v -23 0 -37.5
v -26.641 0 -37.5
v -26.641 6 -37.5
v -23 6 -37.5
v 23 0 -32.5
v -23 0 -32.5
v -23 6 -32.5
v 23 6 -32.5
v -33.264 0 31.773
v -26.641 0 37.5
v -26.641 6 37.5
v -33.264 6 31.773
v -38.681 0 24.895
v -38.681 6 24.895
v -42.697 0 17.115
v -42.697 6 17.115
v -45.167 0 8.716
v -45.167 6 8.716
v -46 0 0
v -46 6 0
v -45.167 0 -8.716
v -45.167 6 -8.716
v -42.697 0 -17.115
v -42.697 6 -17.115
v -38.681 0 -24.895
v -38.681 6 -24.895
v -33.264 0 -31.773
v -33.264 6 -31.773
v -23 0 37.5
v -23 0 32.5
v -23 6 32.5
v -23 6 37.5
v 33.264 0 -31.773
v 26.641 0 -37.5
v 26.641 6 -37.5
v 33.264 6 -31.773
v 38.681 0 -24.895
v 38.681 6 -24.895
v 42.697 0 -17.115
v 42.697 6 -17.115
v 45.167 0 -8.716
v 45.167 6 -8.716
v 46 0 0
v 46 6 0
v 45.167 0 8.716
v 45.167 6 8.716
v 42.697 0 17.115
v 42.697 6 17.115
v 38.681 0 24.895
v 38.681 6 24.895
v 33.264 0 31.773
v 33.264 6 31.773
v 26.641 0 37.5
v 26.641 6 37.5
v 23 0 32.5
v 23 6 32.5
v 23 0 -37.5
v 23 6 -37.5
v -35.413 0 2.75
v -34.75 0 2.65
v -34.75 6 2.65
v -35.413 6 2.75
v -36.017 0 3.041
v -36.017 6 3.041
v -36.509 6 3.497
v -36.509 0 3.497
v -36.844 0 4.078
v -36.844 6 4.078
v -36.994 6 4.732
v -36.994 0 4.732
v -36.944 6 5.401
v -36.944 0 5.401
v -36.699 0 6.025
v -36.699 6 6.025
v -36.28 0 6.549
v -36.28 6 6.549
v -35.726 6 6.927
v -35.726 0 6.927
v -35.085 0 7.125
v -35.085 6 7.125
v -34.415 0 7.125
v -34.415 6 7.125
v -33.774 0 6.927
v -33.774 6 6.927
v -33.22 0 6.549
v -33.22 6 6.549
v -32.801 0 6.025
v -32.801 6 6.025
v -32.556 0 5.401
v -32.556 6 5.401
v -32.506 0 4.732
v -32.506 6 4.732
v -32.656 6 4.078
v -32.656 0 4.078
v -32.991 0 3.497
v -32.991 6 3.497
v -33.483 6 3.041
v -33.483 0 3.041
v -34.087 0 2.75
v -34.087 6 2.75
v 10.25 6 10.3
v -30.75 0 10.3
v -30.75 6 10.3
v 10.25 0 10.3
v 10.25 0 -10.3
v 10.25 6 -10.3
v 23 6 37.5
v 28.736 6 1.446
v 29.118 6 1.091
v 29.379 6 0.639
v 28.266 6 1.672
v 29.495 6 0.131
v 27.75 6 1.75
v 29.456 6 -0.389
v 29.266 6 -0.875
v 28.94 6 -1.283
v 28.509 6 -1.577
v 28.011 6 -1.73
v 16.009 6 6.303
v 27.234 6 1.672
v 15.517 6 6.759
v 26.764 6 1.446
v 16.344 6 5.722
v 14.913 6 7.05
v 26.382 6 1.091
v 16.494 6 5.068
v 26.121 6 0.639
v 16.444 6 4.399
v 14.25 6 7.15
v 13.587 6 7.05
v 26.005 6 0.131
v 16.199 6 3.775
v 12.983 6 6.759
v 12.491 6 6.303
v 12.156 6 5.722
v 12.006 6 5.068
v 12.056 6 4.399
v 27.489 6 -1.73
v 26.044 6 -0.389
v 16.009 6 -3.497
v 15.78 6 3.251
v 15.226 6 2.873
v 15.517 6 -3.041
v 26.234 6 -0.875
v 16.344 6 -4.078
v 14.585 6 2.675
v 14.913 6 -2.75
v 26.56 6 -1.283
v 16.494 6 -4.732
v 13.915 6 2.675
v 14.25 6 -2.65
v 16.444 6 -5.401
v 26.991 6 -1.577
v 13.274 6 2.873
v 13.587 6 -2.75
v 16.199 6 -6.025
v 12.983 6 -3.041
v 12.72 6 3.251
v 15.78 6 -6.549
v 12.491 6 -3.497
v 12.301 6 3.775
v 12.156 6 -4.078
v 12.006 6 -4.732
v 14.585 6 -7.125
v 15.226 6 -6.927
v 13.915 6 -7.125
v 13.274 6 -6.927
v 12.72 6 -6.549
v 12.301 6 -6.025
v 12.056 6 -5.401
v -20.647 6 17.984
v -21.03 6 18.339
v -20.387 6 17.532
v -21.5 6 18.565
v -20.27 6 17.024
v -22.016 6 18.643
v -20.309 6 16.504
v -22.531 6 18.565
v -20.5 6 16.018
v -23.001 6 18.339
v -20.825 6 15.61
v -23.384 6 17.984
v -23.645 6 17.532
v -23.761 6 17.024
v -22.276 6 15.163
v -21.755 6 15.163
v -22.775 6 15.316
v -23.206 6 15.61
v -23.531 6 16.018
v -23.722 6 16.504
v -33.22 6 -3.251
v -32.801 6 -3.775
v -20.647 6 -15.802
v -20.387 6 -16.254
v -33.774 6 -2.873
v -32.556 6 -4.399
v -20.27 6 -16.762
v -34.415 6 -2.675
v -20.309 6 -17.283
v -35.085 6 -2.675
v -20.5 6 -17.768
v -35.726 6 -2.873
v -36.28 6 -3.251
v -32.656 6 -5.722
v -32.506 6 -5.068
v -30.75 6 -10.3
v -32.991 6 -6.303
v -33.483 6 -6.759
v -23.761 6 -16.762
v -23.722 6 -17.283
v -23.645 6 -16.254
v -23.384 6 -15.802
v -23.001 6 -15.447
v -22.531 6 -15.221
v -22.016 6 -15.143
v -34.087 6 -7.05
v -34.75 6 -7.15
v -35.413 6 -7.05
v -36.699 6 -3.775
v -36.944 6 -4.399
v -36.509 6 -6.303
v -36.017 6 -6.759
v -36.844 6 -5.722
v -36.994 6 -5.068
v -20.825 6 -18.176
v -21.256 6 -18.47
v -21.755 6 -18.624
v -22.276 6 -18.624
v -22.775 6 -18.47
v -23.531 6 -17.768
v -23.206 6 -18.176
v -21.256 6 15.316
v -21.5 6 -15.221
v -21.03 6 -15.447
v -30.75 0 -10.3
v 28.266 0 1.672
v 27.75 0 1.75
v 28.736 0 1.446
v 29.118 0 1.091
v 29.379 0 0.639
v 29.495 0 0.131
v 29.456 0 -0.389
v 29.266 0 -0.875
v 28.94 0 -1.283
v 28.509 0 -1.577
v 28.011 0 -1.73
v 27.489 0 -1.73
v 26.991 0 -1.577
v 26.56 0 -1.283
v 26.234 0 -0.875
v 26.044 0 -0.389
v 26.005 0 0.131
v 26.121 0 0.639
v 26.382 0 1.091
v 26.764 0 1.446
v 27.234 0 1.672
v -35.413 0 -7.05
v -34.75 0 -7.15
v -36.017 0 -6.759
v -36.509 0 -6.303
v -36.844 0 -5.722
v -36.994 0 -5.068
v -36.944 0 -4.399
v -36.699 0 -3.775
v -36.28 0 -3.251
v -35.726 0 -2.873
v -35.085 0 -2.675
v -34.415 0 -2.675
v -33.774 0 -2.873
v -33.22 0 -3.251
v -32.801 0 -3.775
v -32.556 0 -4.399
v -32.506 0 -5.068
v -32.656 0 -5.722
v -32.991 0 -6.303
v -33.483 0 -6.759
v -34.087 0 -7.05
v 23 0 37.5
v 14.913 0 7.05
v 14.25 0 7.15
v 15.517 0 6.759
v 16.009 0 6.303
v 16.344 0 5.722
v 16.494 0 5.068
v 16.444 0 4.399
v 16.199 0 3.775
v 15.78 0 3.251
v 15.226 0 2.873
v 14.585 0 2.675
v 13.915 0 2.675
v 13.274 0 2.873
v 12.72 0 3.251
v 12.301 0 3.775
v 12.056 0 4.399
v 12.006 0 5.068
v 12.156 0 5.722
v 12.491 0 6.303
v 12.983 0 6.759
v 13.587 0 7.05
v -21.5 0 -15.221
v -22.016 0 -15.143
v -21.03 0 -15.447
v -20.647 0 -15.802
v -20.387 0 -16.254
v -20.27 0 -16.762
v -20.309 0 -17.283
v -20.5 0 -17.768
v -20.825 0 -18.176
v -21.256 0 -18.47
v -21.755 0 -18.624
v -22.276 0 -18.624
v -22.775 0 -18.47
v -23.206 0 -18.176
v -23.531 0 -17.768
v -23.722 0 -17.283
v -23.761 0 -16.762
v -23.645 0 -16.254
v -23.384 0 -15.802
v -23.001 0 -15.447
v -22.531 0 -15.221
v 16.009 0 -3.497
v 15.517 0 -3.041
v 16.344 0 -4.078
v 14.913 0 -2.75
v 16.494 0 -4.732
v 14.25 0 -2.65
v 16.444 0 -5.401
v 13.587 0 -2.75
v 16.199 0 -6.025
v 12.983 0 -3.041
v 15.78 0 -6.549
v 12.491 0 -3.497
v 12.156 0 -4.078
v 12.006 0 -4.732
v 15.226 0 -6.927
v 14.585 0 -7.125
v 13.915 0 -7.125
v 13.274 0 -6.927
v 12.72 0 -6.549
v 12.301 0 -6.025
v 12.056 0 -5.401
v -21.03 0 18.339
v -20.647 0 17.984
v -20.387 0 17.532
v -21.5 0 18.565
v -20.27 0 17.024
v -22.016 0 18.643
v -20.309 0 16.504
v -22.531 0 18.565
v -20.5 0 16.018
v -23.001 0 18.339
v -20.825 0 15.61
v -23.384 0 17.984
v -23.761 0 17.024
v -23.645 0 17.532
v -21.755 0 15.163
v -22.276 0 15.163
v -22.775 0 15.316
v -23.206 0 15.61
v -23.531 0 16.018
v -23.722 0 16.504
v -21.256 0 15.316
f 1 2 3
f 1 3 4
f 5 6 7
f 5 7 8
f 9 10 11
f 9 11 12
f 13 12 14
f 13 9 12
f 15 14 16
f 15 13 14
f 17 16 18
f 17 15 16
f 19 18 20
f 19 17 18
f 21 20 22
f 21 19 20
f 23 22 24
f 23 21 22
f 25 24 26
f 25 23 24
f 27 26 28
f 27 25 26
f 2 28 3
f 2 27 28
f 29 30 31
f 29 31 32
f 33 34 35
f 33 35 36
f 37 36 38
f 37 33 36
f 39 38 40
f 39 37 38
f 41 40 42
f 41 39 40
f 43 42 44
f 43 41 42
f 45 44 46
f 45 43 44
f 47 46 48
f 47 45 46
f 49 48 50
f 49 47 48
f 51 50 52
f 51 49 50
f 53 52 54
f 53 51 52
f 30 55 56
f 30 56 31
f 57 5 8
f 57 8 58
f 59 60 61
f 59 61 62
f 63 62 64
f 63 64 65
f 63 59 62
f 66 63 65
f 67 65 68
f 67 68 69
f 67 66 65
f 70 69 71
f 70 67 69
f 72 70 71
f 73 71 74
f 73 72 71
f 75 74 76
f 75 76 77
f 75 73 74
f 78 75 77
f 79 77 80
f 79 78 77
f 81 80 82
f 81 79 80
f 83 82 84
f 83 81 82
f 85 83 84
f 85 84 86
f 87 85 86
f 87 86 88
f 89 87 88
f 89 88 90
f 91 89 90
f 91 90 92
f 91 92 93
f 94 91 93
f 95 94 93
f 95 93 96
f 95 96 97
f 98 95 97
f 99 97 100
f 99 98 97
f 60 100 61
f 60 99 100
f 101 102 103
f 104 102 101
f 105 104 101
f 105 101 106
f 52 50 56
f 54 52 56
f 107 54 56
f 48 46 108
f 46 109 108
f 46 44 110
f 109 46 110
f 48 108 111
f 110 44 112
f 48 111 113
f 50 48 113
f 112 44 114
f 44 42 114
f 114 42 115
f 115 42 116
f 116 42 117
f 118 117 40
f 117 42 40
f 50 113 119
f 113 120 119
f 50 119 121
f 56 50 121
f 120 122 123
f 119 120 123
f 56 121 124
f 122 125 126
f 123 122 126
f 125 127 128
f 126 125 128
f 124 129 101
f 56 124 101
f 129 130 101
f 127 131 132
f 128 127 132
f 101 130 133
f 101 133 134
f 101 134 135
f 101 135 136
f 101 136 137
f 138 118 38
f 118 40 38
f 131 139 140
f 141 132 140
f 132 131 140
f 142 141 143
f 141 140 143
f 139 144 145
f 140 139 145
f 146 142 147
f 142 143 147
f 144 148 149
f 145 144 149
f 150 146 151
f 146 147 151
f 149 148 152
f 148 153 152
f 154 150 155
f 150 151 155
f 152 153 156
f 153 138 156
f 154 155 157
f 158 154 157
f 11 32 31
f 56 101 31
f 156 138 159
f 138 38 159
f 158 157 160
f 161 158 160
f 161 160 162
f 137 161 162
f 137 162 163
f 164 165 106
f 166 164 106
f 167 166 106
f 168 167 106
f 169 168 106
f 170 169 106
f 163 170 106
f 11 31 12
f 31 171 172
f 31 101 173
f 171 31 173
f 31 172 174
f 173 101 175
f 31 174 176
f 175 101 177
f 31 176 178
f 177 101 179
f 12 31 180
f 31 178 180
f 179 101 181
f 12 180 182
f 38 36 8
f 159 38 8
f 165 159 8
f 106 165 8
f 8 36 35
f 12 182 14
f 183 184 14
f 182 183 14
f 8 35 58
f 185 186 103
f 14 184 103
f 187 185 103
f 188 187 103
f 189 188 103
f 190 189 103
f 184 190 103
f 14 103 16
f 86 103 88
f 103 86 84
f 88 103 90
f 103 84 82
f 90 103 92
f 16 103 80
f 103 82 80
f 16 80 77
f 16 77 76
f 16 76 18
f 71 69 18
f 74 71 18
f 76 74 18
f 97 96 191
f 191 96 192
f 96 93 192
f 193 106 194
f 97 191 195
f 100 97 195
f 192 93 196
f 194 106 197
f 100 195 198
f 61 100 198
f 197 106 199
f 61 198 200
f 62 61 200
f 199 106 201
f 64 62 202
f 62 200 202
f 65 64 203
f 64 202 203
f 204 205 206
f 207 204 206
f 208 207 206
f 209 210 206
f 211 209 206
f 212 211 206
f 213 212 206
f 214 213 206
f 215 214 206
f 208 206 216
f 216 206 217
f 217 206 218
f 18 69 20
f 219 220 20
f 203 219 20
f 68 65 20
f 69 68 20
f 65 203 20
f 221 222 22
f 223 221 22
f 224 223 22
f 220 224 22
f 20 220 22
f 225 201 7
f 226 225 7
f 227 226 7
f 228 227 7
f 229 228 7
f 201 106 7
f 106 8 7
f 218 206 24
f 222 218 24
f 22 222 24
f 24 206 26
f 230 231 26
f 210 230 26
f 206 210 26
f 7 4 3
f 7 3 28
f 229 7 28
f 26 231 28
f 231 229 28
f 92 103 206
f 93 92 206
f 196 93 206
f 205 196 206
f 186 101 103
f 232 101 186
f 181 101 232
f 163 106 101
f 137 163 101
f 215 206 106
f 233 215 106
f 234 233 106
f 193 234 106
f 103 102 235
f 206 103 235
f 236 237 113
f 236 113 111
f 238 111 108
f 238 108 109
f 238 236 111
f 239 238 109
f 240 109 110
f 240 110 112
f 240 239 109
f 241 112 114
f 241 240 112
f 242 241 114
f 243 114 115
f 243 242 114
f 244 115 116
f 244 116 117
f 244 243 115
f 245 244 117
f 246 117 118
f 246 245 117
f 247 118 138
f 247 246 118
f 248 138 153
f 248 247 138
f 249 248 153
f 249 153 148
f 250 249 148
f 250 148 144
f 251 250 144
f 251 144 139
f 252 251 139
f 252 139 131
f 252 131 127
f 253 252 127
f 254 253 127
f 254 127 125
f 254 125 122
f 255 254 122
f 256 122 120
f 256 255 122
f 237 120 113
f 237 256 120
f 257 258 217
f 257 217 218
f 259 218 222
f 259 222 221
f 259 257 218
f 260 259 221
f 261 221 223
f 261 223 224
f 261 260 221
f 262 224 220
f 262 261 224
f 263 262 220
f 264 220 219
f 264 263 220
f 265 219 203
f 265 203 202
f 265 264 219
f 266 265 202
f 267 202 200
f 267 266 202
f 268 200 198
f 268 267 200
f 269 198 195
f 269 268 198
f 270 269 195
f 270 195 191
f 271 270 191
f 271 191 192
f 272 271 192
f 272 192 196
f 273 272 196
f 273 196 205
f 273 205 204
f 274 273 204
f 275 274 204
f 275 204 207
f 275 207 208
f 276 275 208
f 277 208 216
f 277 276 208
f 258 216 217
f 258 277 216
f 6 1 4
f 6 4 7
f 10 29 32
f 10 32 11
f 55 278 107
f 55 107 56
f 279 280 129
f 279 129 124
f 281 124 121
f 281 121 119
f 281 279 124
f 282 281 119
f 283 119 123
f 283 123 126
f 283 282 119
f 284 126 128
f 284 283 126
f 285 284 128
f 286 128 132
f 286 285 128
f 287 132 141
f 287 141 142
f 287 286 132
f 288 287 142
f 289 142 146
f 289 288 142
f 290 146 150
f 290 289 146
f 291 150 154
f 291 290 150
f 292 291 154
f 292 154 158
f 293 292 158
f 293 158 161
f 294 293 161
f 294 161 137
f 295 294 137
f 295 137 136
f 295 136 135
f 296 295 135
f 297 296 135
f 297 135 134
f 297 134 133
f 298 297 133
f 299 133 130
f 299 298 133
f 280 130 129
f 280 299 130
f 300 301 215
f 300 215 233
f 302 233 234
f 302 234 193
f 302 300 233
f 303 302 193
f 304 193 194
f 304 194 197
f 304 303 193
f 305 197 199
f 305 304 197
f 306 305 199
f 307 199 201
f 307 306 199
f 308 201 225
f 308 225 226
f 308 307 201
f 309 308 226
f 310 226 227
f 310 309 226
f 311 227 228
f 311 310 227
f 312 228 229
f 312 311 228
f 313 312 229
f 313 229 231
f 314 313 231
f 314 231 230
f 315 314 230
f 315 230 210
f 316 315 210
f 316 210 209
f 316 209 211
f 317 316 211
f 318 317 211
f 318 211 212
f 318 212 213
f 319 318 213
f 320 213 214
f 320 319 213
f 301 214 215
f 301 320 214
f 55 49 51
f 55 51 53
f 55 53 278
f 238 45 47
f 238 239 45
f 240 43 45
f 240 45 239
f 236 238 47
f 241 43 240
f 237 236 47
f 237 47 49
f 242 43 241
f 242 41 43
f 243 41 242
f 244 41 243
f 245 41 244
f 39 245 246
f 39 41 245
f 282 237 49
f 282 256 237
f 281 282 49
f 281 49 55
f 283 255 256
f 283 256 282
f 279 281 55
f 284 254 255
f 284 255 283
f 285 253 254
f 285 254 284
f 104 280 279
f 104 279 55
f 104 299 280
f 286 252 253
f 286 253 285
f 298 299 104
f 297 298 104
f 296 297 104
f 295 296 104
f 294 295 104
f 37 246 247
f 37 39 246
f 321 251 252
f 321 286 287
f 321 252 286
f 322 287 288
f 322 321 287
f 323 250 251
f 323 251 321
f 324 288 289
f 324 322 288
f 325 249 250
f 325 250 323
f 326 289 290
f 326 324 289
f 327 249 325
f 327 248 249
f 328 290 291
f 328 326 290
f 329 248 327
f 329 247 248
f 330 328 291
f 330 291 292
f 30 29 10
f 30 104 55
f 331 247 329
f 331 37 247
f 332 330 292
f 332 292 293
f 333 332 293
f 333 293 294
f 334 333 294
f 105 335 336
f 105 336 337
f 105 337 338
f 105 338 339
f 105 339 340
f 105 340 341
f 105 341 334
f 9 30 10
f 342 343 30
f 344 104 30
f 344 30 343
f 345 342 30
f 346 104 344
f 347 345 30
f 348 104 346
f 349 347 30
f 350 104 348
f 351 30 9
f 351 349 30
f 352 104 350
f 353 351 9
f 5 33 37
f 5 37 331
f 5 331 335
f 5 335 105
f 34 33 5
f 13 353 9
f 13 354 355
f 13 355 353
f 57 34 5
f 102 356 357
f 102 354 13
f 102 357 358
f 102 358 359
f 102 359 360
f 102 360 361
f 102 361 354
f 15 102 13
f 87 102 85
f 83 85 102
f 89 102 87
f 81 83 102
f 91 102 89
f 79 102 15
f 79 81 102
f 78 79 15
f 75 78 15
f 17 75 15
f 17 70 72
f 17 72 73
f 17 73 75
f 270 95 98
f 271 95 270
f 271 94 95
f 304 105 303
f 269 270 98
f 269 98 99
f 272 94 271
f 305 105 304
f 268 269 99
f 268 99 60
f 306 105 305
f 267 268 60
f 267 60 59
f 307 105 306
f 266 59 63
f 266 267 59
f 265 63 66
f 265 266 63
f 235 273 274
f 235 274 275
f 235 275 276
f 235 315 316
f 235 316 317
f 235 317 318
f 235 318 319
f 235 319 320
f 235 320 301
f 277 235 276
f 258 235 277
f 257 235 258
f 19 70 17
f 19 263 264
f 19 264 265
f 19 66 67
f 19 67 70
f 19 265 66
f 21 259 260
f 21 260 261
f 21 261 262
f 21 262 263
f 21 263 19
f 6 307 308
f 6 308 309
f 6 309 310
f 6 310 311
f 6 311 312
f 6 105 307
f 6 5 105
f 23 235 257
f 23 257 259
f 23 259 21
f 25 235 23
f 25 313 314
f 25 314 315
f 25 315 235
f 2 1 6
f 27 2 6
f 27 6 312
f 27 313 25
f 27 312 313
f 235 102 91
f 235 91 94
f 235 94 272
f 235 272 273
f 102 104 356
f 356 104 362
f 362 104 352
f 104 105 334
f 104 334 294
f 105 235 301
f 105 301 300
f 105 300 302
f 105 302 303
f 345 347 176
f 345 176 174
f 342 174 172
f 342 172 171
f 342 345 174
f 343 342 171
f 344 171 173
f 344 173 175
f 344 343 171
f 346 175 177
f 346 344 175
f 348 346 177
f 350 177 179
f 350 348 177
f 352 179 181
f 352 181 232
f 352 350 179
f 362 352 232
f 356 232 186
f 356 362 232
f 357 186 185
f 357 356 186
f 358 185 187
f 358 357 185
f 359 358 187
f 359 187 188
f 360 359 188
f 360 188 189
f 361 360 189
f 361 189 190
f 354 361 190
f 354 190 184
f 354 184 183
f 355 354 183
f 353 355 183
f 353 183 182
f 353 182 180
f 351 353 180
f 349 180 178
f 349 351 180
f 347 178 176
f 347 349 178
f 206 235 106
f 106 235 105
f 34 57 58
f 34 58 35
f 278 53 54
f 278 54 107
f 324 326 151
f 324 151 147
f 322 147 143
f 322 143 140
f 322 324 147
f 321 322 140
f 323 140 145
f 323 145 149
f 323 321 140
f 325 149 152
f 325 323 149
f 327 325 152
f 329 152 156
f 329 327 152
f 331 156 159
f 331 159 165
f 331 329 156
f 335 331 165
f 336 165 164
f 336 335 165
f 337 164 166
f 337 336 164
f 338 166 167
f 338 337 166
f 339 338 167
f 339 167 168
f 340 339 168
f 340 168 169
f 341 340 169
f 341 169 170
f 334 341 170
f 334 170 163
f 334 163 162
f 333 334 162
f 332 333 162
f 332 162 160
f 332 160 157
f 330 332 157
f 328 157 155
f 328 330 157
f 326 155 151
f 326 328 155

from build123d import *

# Parameters (mm, degrees)
SKETCH1_R           = 2.25
SKETCH1_R_2         = 1.75
SKETCH1_W           = 41
SKETCH1_H           = 20.6
BOSS_EXTRUDE1_DEPTH = 6


with BuildPart() as part:
    # Sketch1 → Boss-Extrude1 (new body)
    with BuildSketch(Plane(origin=(0, 0, 0), x_dir=(1, 0, 0), z_dir=(0, 1, 0))):
        with BuildLine():
            Line((-26.64113361, 37.5), (-23, 37.5))
            Line((-23, 37.5), (-23, 32.5))
            Line((-23, 32.5), (23, 32.5))
            Line((23, 32.5), (23, 37.5))
            Line((23, 37.5), (26.64113361, 37.5))
            ThreePointArc((26.64113361, 37.5), (46, 0), (26.64113361, -37.5))
            Line((26.64113361, -37.5), (23, -37.5))
            Line((23, -37.5), (23, -32.5))
            Line((23, -32.5), (-23, -32.5))
            Line((-23, -32.5), (-23, -37.5))
            Line((-23, -37.5), (-26.64113361, -37.5))
            ThreePointArc((-26.64113361, -37.5), (-46, 0), (-26.64113361, 37.5))
        make_face()
        with Locations(Location((14.25, 4.9, 0), (0, 0, 270))):
            Circle(SKETCH1_R, mode=Mode.SUBTRACT)
        with Locations(Location((14.25, -4.9, 0), (0, 0, 270))):
            Circle(SKETCH1_R, mode=Mode.SUBTRACT)
        with Locations(Location((-34.75, 4.9, 0), (0, 0, 90))):
            Circle(SKETCH1_R, mode=Mode.SUBTRACT)
        with Locations(Location((-34.75, -4.9, 0), (0, 0, 90))):
            Circle(SKETCH1_R, mode=Mode.SUBTRACT)
        with Locations(Location((27.75, 0, 0), (0, 0, 270))):
            Circle(SKETCH1_R_2, mode=Mode.SUBTRACT)
        with Locations(Location((-22.015555193, 16.893129655, 0), (0, 0, 270))):
            Circle(SKETCH1_R_2, mode=Mode.SUBTRACT)
        with Locations(Location((-22.015555193, -16.893129655, 0), (0, 0, 270))):
            Circle(SKETCH1_R_2, mode=Mode.SUBTRACT)
        with Locations((-10.25, 0)):
            Rectangle(SKETCH1_W, SKETCH1_H, mode=Mode.SUBTRACT)
    extrude(amount=BOSS_EXTRUDE1_DEPTH)


solid = part.part
